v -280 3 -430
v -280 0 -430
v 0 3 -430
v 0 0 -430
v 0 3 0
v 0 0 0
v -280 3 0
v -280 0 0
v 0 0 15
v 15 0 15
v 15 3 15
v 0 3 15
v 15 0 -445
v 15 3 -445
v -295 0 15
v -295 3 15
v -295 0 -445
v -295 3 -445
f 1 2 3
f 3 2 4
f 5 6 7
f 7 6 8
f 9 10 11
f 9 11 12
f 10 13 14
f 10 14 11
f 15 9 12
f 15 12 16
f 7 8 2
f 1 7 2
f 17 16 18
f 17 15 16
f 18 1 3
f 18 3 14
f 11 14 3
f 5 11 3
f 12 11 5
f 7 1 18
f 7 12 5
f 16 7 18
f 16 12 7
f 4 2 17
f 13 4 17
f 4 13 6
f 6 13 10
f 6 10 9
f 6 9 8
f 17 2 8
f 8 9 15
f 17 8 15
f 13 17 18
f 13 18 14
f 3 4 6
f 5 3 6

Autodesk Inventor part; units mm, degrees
ref_plane "YZ Plane" through (0, 0, 0) normal (1, 0, 0) x (0, 1, 0)
ref_plane "XZ Plane" through (0, 0, 0) normal (0, 1, 0) x (-1, 0, 0)
ref_plane "XY Plane" through (0, 0, 0) normal (0, 0, 1) x (1, 0, 0)
sketch "Boceto1" plane through (0, 0, 0) normal (0, 1, 0) x (-1, 0, 0)
  line L0 (0, 0) -> (280, 0)
  line L1 (280, 0) -> (280, -430)
  line L2 (280, -430) -> (0, -430)
  line L3 (0, -430) -> (0, 0)
  line L4 (0, 15) -> (295, 15)
  line L5 (295, 15) -> (295, -445)
  line L6 (295, -445) -> (-15, -445)
  line L7 (-15, -445) -> (-15, 15)
  line L8 (-15, 15) -> (0, 15)
  dimension "d0" = 280
  dimension "d1" = 430
  dimension "d2" = 15
  dimension "d3" = 295
  dimension "d4" = 460
  dimension "d5" = 310
extrude "Extrusión1" add sketch "Boceto1" along normal blind 3
properties part number "Marco molde"
